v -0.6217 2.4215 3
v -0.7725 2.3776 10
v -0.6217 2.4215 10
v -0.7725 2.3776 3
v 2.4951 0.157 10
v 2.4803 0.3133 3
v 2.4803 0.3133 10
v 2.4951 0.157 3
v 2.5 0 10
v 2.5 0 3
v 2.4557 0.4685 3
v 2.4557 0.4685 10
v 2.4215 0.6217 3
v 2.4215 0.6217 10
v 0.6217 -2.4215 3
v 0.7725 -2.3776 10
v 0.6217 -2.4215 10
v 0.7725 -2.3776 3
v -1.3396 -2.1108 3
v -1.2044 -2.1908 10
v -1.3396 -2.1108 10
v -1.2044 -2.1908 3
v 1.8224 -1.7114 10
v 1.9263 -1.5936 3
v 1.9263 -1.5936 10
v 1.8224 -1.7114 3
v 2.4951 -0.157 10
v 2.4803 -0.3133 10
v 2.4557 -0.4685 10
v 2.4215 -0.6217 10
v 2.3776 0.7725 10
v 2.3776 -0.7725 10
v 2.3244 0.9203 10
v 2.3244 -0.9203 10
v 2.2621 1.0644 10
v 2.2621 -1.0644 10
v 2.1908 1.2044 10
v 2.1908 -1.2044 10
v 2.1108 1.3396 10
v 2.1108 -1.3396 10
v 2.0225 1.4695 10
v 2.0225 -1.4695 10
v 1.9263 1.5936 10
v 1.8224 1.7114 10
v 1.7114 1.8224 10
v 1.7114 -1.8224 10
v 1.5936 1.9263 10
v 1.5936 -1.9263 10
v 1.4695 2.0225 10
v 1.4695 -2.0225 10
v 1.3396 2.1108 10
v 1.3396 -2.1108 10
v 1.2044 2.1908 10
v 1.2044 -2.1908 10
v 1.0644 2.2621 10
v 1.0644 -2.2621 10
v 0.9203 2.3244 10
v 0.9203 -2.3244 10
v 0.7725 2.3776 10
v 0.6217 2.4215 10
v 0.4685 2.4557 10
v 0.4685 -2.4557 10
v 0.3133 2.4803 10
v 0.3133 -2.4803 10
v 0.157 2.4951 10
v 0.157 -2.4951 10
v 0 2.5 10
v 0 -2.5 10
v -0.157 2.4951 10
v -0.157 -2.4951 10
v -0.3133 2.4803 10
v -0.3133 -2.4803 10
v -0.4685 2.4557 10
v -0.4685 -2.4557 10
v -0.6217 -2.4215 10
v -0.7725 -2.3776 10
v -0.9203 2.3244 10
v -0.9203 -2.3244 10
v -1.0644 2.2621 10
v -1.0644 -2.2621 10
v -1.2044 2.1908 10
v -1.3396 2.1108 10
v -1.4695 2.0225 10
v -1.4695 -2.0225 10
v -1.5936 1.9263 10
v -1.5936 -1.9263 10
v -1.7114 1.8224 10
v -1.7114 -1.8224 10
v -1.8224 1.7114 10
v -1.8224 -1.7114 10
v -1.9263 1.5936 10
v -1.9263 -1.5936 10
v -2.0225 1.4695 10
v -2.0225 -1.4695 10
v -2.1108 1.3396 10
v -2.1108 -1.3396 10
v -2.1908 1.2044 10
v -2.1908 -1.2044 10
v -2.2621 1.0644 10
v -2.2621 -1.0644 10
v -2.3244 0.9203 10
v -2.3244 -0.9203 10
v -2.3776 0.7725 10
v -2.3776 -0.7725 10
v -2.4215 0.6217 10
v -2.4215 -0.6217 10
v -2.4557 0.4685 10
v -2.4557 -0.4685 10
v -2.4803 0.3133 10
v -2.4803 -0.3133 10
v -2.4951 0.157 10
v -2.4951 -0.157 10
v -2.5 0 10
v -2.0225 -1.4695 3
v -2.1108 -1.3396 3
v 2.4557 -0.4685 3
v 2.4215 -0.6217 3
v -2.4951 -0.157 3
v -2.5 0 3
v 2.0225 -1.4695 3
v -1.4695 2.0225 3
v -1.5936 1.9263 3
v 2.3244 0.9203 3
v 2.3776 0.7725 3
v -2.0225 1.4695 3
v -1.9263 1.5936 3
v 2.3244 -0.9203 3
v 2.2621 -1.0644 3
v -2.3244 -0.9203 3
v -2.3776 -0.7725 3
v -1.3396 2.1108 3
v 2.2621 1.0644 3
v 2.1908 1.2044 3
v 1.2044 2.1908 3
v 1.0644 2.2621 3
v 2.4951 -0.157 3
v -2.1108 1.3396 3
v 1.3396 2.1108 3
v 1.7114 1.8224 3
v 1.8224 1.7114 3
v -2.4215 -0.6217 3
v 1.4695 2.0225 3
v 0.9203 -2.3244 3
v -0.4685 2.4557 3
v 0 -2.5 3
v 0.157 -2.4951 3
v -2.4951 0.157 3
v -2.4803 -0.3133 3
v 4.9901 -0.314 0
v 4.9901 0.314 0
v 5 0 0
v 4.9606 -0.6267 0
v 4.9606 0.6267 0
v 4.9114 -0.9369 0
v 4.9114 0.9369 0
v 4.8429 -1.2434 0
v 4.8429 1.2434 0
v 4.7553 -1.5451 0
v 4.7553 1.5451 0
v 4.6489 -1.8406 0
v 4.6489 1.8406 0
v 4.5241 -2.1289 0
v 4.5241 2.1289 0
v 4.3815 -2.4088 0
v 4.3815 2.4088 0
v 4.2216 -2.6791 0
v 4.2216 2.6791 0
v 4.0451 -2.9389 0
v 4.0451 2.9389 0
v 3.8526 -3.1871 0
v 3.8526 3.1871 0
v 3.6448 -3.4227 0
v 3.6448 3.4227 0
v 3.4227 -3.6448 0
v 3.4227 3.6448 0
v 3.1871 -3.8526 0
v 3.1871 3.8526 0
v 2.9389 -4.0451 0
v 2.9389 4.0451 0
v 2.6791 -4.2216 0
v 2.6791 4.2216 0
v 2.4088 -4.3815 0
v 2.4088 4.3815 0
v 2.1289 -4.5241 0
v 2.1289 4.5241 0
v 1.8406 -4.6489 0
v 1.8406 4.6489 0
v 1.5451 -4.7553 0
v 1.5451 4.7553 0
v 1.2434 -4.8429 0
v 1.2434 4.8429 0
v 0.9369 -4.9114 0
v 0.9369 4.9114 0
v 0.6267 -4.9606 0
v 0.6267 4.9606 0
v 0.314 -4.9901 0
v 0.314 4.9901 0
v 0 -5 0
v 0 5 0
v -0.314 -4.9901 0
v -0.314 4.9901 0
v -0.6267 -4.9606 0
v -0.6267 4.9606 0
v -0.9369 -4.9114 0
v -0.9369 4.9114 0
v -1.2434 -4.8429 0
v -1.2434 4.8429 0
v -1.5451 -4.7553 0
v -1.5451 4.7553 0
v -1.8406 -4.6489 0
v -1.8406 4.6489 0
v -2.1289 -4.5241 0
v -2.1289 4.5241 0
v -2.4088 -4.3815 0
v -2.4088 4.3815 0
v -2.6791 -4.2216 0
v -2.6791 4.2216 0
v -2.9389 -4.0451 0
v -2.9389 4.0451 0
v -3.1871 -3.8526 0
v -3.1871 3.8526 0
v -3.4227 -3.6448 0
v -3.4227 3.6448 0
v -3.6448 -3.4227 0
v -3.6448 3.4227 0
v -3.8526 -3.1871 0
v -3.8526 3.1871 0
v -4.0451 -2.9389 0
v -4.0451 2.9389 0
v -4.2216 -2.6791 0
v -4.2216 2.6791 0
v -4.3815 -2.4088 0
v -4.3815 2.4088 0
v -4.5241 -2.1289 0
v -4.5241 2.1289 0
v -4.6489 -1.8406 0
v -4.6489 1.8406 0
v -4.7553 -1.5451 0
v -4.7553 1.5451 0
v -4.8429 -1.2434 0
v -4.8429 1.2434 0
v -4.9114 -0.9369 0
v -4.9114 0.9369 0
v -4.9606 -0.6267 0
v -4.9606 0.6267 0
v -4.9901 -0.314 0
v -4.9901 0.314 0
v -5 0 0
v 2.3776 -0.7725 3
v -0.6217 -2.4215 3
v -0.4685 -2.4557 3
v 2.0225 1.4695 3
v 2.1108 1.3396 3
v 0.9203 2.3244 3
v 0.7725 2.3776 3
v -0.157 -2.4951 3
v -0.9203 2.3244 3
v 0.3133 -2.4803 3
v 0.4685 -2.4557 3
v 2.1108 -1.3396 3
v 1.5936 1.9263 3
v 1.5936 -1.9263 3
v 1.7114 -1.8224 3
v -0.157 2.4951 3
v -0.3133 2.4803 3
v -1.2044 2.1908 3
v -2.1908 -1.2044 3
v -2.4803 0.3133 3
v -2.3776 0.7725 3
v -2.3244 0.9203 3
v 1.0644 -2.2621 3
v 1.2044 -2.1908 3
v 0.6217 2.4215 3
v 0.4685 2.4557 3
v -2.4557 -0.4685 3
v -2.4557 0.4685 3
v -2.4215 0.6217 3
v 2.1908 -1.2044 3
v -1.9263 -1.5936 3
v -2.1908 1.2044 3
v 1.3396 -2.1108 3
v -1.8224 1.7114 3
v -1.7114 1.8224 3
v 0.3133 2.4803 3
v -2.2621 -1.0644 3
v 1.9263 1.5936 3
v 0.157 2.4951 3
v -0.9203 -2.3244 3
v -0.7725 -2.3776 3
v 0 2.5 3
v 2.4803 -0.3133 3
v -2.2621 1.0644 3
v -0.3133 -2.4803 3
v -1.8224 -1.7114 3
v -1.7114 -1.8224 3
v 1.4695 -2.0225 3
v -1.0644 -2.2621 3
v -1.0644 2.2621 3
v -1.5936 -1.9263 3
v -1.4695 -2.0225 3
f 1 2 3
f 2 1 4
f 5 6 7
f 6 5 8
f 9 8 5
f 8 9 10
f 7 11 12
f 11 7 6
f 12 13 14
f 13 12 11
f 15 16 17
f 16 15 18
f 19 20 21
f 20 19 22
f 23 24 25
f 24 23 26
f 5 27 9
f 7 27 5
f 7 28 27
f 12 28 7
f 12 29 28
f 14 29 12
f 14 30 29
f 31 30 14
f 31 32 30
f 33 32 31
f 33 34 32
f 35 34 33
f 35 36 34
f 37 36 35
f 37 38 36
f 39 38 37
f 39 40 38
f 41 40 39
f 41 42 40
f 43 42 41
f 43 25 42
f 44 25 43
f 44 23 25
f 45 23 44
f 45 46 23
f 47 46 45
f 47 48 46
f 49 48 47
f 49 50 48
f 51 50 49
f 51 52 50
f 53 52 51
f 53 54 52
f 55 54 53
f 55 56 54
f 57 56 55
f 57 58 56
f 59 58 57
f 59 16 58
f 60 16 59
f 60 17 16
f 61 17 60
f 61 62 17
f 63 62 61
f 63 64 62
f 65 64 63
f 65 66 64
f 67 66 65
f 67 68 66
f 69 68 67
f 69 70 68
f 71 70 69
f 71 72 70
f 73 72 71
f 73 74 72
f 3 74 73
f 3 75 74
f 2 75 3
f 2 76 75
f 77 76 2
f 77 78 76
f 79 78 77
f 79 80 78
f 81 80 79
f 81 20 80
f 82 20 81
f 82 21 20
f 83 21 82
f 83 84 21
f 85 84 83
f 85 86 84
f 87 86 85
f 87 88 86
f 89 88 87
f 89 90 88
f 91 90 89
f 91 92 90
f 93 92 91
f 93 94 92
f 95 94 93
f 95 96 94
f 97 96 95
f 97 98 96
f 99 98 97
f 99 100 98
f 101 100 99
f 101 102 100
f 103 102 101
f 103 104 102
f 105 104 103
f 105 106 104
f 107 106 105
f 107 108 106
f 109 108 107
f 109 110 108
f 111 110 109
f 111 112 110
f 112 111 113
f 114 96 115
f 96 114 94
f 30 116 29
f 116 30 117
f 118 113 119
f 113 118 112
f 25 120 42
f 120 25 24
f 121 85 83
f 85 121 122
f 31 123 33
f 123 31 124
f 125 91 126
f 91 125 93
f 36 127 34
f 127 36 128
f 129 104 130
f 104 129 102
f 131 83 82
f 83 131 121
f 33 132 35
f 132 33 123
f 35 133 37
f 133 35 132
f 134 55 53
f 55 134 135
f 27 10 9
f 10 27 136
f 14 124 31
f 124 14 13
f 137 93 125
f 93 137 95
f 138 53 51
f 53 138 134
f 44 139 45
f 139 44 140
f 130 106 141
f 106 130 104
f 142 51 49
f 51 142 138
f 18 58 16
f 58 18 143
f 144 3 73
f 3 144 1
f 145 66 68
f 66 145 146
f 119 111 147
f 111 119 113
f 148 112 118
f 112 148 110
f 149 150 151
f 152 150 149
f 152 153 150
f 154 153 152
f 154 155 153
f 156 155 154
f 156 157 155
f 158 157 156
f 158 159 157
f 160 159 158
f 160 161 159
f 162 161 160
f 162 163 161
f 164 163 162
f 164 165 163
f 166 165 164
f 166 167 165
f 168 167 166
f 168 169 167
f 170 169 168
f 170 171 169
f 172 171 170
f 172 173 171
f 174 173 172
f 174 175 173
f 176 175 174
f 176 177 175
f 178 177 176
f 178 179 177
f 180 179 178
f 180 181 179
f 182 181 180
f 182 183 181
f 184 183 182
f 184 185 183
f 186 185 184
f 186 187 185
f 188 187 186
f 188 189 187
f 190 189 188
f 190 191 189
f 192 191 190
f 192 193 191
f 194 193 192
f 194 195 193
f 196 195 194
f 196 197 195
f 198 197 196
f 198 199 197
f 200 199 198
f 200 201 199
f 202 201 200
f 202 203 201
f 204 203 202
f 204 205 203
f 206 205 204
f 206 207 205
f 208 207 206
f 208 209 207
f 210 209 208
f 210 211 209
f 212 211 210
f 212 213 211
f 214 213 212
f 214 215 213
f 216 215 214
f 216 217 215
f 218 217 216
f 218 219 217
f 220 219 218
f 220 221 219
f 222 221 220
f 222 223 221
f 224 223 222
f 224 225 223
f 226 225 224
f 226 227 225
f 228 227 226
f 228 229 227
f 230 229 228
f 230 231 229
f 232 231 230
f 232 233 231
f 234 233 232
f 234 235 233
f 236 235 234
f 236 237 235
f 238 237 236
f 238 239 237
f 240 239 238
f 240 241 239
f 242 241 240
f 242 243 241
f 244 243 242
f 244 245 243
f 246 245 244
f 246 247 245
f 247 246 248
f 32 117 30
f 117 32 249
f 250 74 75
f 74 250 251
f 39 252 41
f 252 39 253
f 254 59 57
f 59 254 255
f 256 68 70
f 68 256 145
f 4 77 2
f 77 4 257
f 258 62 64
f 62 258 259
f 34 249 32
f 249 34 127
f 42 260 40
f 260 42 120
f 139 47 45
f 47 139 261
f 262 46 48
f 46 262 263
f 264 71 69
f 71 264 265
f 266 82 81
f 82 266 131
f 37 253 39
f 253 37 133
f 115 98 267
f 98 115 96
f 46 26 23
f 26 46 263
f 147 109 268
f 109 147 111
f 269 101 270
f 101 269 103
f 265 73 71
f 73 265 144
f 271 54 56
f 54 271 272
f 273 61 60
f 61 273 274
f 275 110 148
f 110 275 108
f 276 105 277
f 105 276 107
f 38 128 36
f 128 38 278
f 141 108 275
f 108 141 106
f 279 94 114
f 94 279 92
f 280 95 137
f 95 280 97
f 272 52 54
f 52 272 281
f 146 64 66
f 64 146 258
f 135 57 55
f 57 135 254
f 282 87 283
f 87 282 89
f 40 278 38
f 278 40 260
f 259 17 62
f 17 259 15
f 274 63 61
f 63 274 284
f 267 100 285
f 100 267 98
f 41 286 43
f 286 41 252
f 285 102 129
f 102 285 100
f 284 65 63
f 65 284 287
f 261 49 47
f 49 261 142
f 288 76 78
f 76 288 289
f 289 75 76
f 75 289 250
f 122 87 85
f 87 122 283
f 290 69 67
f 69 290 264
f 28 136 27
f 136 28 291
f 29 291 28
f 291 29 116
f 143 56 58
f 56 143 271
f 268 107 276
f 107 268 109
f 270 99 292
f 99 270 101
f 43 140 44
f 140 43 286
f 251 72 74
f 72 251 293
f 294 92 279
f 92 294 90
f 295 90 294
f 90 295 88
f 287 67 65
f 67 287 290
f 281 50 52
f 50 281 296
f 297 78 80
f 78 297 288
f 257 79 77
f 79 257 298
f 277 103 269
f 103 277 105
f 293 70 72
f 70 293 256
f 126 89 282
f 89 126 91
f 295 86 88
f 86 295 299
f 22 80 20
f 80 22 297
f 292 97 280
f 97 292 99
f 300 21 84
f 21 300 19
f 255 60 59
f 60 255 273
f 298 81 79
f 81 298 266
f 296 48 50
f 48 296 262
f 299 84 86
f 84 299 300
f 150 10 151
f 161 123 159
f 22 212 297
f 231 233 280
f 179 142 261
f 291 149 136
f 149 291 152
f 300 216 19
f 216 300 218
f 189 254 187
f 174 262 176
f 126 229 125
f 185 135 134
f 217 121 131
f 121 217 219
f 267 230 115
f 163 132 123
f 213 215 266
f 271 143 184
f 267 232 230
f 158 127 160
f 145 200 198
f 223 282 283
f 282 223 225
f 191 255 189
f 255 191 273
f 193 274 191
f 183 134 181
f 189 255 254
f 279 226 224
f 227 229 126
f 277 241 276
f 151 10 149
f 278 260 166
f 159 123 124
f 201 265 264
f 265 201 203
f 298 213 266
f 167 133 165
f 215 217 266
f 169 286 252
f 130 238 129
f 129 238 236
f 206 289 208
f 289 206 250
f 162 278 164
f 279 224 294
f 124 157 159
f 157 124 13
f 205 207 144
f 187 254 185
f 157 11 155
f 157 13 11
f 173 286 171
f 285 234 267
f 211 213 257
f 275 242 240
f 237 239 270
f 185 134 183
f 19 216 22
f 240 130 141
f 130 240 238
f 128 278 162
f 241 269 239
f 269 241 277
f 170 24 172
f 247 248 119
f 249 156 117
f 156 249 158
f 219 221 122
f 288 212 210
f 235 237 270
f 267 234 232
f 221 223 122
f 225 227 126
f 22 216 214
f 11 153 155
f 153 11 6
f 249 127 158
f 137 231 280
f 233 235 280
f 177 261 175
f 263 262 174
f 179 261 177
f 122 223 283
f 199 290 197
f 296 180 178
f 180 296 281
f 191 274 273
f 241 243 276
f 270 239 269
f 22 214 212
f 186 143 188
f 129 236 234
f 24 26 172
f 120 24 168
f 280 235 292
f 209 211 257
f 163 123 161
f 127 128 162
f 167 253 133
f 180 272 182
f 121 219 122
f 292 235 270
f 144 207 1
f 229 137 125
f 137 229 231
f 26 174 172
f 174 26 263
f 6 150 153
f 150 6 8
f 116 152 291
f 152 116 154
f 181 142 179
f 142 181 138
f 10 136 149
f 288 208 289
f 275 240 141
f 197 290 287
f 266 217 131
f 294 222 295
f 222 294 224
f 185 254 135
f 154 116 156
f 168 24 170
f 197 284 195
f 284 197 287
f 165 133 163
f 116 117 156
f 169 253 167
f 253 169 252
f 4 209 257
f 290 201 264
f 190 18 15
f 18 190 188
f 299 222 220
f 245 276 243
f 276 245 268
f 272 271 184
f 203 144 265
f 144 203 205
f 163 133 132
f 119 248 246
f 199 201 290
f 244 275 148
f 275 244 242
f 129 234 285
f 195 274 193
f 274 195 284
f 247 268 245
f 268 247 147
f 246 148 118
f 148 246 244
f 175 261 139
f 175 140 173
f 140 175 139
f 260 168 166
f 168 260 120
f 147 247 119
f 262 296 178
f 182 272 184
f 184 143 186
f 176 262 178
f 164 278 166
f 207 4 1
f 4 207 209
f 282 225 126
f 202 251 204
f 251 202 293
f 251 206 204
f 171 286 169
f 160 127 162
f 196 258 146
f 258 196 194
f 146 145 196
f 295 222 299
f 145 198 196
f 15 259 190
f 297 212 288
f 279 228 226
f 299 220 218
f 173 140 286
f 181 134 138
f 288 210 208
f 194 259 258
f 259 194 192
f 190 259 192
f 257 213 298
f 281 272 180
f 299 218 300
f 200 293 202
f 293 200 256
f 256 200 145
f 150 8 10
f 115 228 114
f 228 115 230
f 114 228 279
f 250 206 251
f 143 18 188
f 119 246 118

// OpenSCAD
$fn=100;

//cube([200,200,200],false);
union(){
	//translate([-2.5,-2.5,3]){
		cylinder(10,2.5,2.5,false);
	//}
	//translate([-2.5,-2.5,0]){
		cylinder(3,5,2.5,false);
	//}
}
/*
radius = 70;
height = 40;
//width = height/1.61;
width = 60;
thickness = 6;
translateR = sqrt((radius+thickness)*(radius+thickness)-(width*width/4))-thickness;


intersection(){
	translate([0,-200,0]){
		cube([width,400,400],false);
	}
	difference(){
		union(){
			difference(){
				cube([width,thickness,height]);
			}
			translate([width/2,thickness,-translateR]){
				rotate([90,0,0]){
					cylinder(40, (radius+thickness),(radius+thickness), false);
				}
			}
		}

		translate([width/2,7,-translateR]){
			rotate([90,0,0]){
				cylinder(48,radius,radius,false);
			}
		}
	}
}
*/
